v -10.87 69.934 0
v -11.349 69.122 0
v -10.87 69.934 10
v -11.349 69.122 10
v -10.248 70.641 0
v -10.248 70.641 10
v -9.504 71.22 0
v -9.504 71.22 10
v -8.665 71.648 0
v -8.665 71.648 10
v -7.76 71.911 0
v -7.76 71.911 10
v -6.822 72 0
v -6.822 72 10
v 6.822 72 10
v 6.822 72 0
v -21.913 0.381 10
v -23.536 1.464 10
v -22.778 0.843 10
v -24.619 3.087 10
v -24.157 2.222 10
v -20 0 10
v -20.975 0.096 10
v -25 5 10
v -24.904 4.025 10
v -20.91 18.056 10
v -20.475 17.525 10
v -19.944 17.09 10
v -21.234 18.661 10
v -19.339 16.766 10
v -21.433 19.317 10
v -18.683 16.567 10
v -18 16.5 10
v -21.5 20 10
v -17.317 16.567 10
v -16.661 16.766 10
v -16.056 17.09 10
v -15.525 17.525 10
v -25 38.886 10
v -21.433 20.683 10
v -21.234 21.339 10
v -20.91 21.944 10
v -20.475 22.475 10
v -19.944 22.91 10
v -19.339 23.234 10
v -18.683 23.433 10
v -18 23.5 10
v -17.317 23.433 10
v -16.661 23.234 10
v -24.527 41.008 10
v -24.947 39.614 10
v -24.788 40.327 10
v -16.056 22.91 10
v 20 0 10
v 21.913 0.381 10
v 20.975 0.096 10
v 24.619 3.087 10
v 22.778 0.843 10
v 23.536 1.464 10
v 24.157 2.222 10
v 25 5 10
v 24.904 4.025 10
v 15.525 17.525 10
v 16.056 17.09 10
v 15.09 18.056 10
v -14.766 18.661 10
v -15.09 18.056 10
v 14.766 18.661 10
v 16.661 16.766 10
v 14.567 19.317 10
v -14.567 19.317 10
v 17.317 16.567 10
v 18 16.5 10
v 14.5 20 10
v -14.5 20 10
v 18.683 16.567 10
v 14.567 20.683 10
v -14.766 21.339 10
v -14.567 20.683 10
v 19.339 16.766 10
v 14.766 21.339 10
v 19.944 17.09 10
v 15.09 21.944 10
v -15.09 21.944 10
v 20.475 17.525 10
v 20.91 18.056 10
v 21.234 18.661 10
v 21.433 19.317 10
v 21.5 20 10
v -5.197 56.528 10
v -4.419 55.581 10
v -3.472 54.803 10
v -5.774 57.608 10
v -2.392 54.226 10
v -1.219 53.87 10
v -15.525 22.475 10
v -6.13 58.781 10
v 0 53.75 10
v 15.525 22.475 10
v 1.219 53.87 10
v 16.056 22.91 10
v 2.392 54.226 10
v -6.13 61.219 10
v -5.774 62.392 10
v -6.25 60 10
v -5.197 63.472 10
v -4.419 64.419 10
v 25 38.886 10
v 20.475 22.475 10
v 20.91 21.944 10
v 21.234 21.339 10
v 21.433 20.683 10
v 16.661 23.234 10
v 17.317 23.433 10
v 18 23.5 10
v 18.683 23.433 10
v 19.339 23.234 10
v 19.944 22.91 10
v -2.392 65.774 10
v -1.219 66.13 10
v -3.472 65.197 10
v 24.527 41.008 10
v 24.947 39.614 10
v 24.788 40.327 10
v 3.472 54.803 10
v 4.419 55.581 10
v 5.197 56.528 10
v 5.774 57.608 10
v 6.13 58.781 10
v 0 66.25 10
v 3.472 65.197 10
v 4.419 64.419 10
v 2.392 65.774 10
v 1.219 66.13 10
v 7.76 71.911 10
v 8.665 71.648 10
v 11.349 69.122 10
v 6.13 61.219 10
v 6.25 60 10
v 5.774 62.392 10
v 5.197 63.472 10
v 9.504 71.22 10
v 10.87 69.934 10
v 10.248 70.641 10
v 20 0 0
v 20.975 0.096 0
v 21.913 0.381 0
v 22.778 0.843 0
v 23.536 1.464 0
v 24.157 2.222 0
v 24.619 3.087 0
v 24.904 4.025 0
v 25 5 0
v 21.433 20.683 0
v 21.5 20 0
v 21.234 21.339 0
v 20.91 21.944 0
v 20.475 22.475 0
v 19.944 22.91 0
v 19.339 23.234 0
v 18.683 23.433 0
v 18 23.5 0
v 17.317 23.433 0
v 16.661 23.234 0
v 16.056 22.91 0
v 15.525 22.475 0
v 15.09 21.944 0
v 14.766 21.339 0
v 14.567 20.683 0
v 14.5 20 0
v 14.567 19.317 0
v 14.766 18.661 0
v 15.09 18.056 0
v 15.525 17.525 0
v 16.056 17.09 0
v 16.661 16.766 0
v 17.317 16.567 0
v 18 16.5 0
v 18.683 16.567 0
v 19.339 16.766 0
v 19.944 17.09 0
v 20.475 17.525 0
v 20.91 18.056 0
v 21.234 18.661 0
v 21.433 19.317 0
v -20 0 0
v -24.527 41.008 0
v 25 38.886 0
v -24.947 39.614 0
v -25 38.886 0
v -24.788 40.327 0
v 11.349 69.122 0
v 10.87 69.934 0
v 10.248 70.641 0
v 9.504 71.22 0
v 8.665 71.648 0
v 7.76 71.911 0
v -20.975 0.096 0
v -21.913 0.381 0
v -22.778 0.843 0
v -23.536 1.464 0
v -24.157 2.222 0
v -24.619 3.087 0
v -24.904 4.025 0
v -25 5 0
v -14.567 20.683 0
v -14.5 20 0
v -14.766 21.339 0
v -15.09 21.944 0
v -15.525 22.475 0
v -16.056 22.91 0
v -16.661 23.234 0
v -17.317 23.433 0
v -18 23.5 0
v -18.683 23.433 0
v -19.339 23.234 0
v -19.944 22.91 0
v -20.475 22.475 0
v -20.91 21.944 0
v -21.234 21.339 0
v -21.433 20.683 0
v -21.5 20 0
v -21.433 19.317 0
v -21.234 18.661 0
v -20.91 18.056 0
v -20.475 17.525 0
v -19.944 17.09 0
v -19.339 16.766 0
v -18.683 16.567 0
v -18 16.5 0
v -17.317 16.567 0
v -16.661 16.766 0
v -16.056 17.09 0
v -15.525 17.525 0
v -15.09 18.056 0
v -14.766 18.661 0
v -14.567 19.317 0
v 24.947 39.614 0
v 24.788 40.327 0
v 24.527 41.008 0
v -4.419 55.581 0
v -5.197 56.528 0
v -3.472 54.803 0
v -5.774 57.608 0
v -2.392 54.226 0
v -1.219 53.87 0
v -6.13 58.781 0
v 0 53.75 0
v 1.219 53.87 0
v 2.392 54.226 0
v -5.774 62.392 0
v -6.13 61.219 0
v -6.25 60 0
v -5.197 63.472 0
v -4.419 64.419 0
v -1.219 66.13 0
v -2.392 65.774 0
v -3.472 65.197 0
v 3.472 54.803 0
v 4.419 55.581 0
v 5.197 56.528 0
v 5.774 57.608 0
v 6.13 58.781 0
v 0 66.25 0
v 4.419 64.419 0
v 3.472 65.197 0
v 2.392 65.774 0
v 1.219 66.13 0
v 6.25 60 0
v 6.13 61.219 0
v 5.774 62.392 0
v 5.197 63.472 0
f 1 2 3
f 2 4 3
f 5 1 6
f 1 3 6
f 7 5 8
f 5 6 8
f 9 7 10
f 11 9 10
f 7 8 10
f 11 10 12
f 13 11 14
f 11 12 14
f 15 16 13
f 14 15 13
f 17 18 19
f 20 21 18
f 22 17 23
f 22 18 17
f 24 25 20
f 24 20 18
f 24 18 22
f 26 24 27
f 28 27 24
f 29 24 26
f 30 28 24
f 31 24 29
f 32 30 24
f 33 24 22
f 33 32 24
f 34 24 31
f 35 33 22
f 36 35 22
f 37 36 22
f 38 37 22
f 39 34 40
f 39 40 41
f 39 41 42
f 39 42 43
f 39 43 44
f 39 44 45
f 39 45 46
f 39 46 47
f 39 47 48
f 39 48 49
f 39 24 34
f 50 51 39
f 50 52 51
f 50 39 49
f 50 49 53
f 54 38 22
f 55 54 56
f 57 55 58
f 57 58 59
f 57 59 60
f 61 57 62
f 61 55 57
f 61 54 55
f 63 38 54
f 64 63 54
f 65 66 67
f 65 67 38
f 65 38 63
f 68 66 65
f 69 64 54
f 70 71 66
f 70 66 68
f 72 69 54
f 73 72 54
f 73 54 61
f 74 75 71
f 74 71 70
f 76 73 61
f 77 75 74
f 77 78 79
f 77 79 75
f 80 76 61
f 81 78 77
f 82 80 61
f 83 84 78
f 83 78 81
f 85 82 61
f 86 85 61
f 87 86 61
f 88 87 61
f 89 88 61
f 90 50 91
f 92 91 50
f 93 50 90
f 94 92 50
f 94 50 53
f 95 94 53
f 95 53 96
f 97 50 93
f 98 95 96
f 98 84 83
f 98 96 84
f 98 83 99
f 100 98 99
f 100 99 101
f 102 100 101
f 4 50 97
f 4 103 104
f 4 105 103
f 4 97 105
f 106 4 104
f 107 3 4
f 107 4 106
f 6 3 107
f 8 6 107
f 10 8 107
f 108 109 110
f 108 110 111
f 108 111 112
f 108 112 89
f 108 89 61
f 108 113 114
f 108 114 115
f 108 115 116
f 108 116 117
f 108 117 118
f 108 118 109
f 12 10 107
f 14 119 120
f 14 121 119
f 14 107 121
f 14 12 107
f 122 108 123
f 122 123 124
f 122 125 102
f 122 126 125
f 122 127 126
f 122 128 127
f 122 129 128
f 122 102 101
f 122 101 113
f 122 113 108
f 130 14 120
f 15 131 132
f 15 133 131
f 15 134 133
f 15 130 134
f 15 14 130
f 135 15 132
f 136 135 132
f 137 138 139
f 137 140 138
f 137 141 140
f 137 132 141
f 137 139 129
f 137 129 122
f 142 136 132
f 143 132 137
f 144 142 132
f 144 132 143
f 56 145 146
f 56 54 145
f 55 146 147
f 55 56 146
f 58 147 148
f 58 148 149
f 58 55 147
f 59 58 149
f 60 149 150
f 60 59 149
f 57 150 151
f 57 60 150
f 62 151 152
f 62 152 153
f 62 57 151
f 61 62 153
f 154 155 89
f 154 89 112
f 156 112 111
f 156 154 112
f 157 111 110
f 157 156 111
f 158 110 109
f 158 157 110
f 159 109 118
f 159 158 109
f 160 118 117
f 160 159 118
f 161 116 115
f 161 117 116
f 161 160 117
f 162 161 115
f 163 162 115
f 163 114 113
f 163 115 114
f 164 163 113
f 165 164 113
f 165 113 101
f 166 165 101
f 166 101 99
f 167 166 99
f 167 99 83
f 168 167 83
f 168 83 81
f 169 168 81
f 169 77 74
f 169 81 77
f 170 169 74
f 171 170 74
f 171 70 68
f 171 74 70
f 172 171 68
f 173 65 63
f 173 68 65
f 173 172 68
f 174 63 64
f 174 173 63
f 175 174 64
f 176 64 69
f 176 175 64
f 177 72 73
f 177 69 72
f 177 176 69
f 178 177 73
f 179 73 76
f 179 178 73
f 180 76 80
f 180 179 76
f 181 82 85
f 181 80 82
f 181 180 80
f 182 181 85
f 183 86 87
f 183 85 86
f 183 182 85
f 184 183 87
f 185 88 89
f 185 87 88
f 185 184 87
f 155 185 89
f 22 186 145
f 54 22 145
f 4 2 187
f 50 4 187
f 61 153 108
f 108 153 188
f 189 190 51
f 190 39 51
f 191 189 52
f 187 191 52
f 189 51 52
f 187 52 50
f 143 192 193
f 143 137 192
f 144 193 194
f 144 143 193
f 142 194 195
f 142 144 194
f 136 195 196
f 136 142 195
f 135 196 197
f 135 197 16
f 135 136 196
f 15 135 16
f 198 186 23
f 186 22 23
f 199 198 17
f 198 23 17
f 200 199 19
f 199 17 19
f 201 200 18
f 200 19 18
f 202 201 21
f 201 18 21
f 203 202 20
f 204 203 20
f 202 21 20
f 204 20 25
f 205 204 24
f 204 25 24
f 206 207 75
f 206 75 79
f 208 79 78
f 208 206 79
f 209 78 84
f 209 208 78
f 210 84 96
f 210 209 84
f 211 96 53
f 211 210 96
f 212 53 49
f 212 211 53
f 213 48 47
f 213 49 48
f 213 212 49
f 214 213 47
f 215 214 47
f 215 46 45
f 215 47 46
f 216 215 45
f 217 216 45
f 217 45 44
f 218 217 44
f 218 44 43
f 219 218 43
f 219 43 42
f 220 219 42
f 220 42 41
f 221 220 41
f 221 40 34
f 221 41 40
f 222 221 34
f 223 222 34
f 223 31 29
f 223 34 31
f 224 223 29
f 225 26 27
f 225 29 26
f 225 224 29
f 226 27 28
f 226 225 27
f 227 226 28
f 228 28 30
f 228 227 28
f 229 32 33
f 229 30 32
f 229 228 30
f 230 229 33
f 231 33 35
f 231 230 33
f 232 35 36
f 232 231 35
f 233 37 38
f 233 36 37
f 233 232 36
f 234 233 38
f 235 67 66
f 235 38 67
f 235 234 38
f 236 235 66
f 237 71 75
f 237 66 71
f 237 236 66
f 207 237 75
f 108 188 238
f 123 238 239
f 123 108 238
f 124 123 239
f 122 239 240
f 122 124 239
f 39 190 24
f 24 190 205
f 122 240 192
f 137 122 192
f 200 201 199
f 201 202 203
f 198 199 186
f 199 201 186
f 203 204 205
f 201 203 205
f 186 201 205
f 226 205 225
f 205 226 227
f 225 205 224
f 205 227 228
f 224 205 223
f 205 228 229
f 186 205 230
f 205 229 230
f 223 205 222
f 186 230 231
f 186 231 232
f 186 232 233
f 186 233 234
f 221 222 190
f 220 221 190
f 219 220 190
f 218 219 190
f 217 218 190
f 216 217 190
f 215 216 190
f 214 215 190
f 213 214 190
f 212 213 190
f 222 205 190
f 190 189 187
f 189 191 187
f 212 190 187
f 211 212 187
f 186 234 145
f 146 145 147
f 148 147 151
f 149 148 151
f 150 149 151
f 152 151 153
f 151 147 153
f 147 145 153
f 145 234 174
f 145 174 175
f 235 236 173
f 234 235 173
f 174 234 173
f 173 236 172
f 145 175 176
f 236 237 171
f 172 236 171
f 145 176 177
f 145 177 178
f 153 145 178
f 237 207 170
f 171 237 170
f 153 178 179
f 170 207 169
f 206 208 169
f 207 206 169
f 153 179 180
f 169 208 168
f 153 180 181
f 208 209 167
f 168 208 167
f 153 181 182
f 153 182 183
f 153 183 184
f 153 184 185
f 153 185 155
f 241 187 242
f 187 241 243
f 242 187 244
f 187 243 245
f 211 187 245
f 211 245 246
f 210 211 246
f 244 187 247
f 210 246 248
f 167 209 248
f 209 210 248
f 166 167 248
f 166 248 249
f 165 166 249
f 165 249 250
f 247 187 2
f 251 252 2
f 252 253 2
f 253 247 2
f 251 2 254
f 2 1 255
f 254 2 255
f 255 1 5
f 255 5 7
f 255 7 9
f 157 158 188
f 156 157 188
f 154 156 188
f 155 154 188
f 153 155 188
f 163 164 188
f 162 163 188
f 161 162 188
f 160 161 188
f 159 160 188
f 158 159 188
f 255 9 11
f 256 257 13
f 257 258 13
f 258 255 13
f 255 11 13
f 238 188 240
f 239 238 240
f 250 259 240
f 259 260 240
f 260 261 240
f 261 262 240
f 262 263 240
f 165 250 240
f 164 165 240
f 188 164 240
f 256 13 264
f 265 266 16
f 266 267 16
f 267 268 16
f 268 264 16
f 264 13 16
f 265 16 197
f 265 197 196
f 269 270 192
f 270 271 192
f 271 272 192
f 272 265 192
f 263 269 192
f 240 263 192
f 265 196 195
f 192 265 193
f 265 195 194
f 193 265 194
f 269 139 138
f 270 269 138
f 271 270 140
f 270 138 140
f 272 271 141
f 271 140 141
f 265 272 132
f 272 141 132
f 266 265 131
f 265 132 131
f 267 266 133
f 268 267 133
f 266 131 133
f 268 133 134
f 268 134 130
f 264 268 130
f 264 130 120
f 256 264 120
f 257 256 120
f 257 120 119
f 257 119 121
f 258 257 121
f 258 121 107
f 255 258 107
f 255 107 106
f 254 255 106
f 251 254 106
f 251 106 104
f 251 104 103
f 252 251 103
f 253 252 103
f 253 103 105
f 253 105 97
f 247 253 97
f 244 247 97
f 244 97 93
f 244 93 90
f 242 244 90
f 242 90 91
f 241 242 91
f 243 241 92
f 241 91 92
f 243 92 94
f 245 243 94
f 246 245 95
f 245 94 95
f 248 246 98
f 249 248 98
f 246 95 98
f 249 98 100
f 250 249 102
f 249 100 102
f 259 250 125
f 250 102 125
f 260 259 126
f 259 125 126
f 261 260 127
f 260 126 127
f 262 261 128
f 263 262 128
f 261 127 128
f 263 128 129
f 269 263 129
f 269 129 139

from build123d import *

# Parameters (mm, degrees)
BOSS_EXTRU_1_DEPTH           = 10
ENL_V_MAT_EXTRU_1_DEPTH      = 77.870020164
ENL_V_MAT_EXTRU_1_DEPTH_BACK = 77.870020164
ESQUISSE2_R                  = 3.5
CONG_1_R                     = 5
ESQUISSE3_R                  = 6.25
ENL_V_MAT_EXTRU_2_DEPTH      = 77.870020164


with BuildPart() as part:
    # Esquisse1 → Boss.-Extru.1 (new body)
    with BuildSketch(Plane.XY):
        Polygon((-25, 0), (25, 0), (25, 40), (10, 72), (-10, 72), (-25, 40), align=None)
    extrude(amount=BOSS_EXTRU_1_DEPTH)

    # Esquisse2 → Enlèv. mat.-Extru.1 (cut, two sides: drawn at the far end of the back side and taken through both)
    with BuildSketch(Plane.XY.offset(10).offset(-ENL_V_MAT_EXTRU_1_DEPTH_BACK)):
        with Locations((18, 20)):
            Circle(ESQUISSE2_R)
        with Locations((-18, 20)):
            Circle(ESQUISSE2_R)
    extrude(amount=ENL_V_MAT_EXTRU_1_DEPTH + ENL_V_MAT_EXTRU_1_DEPTH_BACK, mode=Mode.SUBTRACT)

    # Congé1
    cong_1_edges = [part.edges().sort_by_distance(p)[0] for p in [
        (25, 0, 5),
        (-25, 0, 5),
        (-25, 40, 5),
        (-10, 72, 5),
        (10, 72, 5),
        (25, 40, 5),
    ]]
    fillet(cong_1_edges, radius=CONG_1_R)

    # Esquisse3 → Enlèv. mat.-Extru.2 (cut, through all)
    with BuildSketch(Plane.XY.offset(10)):
        with Locations((0, 60)):
            Circle(ESQUISSE3_R)
    extrude(amount=-ENL_V_MAT_EXTRU_2_DEPTH, mode=Mode.SUBTRACT)


solid = part.part
